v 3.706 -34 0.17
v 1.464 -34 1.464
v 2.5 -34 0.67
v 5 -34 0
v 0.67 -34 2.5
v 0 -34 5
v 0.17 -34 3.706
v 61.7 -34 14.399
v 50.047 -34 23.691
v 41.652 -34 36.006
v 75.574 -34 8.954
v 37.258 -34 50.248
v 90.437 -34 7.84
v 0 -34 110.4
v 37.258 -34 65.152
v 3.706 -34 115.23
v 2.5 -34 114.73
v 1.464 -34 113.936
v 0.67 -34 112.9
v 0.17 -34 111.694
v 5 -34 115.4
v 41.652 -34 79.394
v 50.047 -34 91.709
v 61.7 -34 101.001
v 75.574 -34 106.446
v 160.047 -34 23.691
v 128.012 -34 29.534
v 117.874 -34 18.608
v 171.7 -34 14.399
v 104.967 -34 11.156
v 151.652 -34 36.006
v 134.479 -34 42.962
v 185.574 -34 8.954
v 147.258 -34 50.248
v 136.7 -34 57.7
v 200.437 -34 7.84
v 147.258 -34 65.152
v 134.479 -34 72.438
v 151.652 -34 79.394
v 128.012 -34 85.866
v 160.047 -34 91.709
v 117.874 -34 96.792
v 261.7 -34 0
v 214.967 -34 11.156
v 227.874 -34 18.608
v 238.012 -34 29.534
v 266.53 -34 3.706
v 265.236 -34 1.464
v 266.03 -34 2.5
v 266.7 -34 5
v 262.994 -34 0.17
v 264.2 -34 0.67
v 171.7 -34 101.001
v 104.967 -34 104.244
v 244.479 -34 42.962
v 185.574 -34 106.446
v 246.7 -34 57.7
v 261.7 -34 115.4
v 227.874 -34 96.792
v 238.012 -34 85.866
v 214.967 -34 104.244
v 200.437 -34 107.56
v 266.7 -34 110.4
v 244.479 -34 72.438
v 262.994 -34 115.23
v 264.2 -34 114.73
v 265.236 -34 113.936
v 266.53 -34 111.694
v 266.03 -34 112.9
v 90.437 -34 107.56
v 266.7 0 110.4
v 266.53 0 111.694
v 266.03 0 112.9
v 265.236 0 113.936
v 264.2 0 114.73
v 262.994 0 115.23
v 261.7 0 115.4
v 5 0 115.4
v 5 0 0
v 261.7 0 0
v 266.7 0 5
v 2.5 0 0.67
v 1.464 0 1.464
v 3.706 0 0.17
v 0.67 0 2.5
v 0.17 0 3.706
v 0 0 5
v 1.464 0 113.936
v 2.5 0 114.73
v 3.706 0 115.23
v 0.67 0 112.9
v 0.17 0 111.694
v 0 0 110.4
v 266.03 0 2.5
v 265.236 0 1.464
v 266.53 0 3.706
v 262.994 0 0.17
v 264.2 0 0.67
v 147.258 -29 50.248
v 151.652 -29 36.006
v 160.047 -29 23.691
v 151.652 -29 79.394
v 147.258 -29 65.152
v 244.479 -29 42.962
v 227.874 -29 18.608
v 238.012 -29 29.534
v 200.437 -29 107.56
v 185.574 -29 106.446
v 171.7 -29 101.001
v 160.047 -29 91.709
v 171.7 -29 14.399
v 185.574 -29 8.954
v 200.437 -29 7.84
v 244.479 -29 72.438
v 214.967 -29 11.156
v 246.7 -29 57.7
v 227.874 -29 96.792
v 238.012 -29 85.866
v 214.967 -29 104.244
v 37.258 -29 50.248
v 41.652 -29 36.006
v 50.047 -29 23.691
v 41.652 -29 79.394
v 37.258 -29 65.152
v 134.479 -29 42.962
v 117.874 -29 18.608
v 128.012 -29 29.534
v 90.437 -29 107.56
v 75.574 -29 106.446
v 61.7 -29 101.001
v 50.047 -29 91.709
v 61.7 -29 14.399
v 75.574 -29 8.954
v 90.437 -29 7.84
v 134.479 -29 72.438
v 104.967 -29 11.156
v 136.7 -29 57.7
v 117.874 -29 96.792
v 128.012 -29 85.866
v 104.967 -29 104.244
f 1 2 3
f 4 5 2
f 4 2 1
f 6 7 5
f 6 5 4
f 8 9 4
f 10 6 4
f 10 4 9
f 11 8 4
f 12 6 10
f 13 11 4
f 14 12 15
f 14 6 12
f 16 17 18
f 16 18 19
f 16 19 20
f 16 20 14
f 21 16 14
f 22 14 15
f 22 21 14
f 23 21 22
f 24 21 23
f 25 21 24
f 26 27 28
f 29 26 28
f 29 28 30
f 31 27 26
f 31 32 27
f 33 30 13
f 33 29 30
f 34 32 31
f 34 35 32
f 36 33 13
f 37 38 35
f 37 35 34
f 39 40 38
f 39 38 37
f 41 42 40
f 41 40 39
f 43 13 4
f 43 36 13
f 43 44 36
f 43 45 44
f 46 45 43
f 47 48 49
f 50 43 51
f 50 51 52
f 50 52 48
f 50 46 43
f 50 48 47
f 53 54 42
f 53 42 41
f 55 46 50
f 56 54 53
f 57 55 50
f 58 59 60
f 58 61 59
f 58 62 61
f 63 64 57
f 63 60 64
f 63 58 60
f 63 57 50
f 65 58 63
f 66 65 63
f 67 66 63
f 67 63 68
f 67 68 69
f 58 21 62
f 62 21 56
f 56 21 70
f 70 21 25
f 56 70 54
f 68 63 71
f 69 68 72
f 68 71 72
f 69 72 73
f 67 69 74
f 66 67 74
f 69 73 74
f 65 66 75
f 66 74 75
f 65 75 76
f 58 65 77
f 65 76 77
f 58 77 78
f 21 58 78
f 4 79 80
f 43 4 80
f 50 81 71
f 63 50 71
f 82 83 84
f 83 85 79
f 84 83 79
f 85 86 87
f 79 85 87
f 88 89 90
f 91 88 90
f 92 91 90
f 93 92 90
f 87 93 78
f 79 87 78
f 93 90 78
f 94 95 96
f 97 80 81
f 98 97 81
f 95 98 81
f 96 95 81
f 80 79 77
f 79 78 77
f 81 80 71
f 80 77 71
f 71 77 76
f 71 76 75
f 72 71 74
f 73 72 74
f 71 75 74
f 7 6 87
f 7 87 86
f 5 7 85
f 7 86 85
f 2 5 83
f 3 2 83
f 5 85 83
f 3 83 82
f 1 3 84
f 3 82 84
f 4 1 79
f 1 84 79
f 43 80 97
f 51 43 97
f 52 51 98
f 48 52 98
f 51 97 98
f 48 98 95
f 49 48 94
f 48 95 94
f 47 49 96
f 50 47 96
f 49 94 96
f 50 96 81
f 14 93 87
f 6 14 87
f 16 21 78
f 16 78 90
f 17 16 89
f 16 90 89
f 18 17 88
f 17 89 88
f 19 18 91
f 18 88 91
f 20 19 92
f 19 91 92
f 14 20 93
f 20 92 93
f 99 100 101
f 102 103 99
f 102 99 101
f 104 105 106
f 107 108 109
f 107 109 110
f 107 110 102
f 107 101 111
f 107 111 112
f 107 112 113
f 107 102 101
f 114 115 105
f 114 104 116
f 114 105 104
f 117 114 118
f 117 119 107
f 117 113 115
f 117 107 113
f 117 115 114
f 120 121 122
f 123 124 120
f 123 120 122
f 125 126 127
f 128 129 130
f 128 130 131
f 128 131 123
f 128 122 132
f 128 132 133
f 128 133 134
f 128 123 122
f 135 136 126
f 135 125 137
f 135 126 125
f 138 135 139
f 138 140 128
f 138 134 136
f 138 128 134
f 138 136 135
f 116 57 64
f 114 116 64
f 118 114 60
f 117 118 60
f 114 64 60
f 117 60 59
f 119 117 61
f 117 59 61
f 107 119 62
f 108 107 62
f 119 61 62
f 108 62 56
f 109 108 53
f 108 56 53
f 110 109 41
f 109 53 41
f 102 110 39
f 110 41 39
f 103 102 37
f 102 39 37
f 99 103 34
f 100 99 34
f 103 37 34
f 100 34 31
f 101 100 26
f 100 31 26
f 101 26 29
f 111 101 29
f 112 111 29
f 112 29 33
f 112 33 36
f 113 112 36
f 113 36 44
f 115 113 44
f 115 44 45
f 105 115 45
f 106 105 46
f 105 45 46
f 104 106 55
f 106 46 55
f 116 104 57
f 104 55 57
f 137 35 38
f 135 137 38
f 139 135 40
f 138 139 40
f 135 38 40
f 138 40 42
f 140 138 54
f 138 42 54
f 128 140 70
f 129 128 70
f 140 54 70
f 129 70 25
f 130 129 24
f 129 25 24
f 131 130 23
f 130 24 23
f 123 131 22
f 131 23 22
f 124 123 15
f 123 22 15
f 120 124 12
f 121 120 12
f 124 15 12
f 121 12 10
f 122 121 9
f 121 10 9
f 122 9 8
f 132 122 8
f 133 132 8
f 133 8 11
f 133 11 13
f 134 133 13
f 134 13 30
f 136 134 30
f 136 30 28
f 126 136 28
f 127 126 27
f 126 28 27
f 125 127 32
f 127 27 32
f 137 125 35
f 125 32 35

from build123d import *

# Parameters (mm, degrees)
F1_DEPTH = 34
F2_R     = 50
F3_DEPTH = 5


with BuildPart() as f1:
    # F0 (on Front) → F1 (new body)
    with BuildSketch(Plane.XZ):
        with BuildLine():
            ThreePointArc((0, 5), (1.464466, 1.464466), (5, 0))
            Line((5, 0), (261.7, 0))
            ThreePointArc((261.7, 0), (265.235534, 1.464466), (266.7, 5))
            Line((266.7, 5), (266.7, 110.4))
            ThreePointArc((266.7, 110.4), (265.235534, 113.935534), (261.7, 115.4))
            Line((261.7, 115.4), (5, 115.4))
            ThreePointArc((5, 115.4), (1.464466, 113.935534), (0, 110.4))
            Line((0, 110.4), (0, 5))
        make_face()
    extrude(amount=F1_DEPTH)

    # F2 (on face) → F3 (cut)
    with BuildSketch(Plane.XZ.offset(34)):
        with Locations((86.7, 57.7)):
            Circle(F2_R)
        with Locations((196.7, 57.7)):
            Circle(F2_R)
    extrude(amount=-F3_DEPTH, mode=Mode.SUBTRACT)


solid = f1.part
